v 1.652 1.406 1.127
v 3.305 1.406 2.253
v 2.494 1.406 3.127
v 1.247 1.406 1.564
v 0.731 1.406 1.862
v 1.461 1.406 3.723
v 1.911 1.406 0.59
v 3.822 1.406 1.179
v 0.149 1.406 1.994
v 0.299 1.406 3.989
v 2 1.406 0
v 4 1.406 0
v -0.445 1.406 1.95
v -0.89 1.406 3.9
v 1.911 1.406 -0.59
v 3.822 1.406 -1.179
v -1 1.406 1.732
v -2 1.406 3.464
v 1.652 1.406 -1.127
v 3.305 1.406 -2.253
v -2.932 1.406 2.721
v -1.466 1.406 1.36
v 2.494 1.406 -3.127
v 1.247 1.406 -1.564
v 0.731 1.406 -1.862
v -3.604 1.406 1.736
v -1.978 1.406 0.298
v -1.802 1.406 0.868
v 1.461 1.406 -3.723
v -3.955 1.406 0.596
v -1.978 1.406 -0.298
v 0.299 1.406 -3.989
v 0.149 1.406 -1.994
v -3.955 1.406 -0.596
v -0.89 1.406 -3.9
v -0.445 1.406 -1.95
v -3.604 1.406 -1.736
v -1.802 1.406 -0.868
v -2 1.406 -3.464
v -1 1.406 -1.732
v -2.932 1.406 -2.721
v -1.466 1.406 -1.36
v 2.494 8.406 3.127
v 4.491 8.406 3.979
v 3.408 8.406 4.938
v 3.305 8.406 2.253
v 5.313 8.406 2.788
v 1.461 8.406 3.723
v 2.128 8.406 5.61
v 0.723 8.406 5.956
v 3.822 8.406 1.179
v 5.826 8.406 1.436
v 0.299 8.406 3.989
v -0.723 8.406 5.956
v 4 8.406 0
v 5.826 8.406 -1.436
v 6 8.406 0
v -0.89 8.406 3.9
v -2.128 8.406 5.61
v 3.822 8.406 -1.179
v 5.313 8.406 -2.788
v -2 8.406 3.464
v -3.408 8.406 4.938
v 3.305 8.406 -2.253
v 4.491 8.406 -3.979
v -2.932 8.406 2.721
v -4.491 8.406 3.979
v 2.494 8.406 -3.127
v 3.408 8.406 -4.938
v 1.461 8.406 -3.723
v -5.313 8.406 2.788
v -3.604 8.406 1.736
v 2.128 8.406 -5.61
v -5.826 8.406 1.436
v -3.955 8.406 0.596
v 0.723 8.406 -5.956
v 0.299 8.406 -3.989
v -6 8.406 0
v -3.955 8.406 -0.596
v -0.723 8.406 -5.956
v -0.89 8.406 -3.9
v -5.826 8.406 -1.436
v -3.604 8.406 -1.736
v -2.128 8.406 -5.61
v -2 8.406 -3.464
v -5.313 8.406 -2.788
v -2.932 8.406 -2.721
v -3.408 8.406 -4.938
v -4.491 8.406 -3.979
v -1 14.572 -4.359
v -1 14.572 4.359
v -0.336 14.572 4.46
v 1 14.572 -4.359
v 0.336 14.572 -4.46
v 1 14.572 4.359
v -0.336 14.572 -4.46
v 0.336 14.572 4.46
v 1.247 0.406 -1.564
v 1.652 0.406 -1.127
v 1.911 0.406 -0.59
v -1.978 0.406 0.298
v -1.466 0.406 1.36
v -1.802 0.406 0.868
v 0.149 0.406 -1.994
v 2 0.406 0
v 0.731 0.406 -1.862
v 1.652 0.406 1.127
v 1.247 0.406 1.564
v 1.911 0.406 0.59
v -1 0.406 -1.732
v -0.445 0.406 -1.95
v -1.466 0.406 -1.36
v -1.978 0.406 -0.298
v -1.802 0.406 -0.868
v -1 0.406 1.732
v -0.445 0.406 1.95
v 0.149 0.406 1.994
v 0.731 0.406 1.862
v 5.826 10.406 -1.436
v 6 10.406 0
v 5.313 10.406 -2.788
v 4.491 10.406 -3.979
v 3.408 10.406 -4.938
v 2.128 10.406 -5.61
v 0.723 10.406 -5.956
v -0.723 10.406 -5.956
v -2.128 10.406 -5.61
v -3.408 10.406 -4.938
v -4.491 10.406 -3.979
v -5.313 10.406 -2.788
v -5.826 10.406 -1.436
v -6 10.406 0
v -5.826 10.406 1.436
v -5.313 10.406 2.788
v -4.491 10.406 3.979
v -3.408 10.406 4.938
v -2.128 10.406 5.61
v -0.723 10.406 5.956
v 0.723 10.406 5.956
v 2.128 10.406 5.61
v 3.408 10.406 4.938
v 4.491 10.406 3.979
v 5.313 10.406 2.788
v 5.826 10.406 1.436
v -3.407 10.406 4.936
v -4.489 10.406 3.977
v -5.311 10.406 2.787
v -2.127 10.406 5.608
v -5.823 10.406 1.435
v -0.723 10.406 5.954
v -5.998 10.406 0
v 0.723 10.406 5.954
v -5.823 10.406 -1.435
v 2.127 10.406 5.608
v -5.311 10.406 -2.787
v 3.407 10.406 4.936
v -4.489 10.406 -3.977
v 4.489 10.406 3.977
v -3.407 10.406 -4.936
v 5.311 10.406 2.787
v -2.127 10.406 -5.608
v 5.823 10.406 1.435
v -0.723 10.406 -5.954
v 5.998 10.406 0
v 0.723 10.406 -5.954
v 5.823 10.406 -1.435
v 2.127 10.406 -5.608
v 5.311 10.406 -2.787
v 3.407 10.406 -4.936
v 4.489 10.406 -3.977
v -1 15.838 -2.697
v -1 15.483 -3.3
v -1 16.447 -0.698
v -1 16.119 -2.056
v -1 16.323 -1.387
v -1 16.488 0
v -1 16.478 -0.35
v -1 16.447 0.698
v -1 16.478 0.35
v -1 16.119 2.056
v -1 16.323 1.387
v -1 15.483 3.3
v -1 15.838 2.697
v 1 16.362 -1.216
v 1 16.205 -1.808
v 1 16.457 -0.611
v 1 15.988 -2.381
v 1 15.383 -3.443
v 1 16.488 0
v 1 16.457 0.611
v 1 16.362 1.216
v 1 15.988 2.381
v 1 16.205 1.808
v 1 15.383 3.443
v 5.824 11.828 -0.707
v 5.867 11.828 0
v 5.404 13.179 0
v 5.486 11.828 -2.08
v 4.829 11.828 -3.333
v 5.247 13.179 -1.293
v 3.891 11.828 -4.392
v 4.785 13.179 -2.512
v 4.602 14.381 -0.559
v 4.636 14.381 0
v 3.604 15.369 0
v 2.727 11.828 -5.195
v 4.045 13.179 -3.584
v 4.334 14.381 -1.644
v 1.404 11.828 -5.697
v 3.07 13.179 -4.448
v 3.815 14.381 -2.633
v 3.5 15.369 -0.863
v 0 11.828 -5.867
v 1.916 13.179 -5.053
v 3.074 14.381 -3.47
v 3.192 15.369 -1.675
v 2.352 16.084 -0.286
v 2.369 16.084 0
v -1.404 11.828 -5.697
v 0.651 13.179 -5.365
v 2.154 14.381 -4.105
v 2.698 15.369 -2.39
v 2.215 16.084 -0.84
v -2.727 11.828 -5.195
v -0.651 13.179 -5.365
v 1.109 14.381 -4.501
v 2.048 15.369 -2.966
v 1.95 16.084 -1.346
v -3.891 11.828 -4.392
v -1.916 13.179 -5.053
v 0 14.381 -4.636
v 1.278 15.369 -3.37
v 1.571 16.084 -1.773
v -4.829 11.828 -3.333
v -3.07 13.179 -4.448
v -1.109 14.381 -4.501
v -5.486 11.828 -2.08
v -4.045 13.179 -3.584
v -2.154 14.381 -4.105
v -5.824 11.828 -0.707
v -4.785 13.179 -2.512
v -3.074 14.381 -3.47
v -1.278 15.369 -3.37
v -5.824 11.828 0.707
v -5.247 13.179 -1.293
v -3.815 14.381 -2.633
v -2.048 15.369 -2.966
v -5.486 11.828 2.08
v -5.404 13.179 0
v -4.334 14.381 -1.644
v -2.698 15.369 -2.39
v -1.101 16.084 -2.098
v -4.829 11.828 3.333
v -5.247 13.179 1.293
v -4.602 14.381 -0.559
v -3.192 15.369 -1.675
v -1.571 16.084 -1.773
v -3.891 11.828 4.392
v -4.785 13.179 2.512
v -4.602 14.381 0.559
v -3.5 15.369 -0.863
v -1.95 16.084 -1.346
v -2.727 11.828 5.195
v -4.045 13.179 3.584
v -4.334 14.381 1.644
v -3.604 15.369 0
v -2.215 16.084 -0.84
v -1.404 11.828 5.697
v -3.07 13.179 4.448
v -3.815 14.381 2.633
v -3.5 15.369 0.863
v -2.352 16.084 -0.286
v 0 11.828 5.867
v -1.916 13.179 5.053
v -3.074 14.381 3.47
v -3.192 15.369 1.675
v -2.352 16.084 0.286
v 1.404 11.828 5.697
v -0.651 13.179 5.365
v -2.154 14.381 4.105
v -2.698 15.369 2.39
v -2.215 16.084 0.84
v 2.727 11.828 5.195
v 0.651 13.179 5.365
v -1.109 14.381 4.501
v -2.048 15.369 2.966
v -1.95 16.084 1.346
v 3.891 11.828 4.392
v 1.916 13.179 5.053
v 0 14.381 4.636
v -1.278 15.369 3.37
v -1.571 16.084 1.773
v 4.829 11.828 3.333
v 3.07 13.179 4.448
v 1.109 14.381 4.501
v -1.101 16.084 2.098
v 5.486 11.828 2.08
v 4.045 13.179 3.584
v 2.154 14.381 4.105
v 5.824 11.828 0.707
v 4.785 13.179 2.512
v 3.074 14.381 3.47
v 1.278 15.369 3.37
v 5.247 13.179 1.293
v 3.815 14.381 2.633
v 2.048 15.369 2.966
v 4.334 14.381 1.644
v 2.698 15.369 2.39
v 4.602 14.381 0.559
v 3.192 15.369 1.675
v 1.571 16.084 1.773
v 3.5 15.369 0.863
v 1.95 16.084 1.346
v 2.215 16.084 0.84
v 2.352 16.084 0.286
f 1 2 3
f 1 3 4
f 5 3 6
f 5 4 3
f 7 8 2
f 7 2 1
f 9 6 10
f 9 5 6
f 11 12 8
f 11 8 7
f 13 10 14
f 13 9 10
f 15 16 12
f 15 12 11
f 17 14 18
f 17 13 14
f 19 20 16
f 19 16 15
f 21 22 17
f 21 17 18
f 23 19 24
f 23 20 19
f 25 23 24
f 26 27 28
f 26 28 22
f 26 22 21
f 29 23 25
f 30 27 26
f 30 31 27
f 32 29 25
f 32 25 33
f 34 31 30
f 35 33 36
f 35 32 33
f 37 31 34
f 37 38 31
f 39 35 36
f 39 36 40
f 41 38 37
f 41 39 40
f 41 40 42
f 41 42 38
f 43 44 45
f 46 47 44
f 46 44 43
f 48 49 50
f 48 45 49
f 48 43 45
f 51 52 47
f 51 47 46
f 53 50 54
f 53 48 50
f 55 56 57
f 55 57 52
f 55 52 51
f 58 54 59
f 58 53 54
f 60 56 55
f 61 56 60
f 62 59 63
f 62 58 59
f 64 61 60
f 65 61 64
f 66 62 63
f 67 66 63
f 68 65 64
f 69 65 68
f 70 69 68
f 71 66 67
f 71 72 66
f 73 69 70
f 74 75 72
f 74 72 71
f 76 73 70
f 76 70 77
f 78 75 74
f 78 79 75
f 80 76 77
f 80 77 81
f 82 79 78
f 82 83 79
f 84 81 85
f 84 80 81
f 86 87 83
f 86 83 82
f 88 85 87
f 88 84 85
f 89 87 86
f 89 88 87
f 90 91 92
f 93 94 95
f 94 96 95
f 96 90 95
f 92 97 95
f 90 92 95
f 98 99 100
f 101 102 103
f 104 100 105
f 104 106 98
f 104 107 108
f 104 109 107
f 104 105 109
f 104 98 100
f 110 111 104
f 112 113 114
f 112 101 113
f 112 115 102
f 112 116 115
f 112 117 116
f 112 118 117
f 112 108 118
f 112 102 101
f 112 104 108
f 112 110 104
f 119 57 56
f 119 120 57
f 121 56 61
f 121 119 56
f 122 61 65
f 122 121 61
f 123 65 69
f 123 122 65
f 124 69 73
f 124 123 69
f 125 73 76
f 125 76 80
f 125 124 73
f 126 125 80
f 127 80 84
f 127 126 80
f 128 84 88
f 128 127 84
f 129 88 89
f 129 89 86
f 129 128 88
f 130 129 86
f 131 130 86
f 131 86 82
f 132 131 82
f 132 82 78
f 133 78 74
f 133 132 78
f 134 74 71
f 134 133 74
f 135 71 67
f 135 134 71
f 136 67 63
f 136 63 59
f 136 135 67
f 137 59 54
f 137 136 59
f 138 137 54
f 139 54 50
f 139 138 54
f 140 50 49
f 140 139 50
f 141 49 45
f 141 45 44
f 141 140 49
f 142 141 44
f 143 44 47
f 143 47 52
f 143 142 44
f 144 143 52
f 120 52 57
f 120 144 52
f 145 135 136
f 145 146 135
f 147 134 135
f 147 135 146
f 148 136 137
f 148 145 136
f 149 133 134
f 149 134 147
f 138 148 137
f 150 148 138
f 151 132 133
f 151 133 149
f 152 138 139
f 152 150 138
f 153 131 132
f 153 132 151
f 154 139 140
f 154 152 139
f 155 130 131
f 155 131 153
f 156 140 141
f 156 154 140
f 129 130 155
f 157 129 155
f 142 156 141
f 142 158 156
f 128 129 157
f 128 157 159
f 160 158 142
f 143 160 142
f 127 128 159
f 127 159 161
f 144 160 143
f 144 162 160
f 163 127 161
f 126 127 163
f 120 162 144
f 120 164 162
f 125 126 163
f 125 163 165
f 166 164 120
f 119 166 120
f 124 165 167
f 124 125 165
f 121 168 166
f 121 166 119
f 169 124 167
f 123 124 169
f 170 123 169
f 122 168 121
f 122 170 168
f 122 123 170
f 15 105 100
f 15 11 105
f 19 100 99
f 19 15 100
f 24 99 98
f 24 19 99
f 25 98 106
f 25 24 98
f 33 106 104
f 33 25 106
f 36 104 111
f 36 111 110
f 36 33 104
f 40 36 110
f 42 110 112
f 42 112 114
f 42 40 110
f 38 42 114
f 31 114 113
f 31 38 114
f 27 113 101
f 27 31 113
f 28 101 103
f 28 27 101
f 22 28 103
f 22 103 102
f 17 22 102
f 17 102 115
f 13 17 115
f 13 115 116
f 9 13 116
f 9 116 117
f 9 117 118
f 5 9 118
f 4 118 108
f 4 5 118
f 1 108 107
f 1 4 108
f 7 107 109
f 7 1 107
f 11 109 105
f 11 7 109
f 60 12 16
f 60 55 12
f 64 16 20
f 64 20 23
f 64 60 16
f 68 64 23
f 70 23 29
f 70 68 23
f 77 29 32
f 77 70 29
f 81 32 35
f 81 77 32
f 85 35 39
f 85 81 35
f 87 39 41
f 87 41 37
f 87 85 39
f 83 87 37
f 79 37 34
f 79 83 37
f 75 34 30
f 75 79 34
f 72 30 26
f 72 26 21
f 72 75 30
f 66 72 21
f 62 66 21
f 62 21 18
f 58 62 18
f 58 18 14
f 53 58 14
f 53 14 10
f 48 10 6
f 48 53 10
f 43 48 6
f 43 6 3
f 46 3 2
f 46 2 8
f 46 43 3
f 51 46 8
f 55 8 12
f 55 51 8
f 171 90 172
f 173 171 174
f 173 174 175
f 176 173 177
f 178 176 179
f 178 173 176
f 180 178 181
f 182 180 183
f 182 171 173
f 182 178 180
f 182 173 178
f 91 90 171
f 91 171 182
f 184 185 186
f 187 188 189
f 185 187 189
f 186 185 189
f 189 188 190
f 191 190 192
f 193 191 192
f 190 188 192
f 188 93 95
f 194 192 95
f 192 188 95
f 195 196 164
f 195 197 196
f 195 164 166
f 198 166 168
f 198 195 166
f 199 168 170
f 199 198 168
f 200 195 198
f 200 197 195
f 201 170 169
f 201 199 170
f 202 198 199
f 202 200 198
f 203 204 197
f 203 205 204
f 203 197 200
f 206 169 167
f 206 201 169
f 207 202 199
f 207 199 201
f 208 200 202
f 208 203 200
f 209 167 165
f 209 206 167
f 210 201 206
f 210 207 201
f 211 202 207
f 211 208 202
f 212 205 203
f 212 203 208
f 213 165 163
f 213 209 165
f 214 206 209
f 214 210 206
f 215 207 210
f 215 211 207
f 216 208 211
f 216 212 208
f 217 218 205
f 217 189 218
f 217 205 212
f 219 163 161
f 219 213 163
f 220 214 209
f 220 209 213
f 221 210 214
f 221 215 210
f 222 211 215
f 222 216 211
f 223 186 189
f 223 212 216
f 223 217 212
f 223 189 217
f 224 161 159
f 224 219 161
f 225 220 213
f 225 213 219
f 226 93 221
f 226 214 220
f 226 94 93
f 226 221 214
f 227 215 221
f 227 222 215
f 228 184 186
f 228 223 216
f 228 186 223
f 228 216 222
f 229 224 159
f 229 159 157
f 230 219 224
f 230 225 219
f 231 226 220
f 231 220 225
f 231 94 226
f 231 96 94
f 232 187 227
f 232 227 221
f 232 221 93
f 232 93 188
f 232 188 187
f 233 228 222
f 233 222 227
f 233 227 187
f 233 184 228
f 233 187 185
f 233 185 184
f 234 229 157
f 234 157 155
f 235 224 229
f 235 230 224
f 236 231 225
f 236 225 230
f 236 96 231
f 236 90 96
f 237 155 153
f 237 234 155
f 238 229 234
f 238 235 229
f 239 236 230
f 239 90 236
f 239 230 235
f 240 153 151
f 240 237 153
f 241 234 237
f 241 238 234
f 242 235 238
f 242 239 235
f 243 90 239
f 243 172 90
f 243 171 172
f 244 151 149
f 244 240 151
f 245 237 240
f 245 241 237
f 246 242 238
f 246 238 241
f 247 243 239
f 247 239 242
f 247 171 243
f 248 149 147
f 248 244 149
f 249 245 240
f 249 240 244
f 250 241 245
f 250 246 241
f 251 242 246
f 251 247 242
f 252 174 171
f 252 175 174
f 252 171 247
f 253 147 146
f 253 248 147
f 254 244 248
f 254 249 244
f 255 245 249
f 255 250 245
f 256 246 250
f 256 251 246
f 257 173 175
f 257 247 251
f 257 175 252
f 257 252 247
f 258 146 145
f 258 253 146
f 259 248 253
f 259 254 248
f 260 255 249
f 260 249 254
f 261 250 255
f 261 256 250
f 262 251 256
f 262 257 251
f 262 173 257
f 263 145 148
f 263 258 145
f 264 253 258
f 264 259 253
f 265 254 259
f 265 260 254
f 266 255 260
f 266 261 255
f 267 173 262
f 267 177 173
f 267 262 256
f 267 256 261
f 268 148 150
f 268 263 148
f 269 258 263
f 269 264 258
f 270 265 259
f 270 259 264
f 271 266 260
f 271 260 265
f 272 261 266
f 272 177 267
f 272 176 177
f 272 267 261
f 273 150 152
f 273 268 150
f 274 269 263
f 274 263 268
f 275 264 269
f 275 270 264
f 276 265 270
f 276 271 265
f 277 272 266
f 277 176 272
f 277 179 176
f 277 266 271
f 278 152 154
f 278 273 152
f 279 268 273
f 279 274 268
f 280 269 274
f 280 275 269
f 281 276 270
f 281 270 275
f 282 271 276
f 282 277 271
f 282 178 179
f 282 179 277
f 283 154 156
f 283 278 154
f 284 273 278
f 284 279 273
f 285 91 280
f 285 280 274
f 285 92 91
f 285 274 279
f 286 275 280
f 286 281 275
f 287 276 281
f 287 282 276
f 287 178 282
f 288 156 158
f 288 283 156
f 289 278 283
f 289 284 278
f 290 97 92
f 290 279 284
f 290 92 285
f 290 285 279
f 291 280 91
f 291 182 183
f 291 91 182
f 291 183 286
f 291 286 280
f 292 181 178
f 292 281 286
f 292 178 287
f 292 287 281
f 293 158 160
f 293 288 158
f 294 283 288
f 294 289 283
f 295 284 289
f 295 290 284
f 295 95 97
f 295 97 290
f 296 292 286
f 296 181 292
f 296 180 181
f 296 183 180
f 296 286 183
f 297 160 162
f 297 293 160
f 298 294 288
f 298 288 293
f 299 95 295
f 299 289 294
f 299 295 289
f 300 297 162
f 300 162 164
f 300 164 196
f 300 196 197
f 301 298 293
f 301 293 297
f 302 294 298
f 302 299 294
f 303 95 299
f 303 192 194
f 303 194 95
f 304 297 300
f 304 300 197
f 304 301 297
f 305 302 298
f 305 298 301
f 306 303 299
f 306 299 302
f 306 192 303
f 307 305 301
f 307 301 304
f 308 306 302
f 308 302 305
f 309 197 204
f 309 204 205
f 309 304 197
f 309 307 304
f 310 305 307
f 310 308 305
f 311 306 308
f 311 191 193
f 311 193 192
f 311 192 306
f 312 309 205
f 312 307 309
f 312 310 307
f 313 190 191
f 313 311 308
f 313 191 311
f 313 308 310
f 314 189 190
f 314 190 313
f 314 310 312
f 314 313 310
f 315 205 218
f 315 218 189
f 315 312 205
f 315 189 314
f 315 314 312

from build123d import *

# Parameters (mm, degrees)
SKETCH2_W          = 2
SKETCH2_H          = 4
CUT_EXTRUDE1_DEPTH = 5


with BuildPart() as part:
    # Sketch1 → Revolve1 (revolve)
    with BuildSketch(Plane.XY):
        with BuildLine():
            Line((6, 10.406467745), (5.997713172, 10.406467745))
            ThreePointArc((5.997713172, 10.406467745), (4.300804682, 14.755776187), (0, 16.572108049))
            Line((0, 16.572108049), (0, 0.406467745))
            Line((0, 0.406467745), (2, 0.406467745))
            Line((2, 0.406467745), (2, 1.406467745))
            Line((2, 1.406467745), (4, 1.406467745))
            Line((4, 1.406467745), (4, 8.406467745))
            Line((4, 8.406467745), (6, 8.406467745))
            Line((6, 8.406467745), (6, 10.406467745))
        make_face()
    revolve(axis=Axis((0, 0.406467745, 0), (0, 1, 0)))

    # Sketch2 → Cut-Extrude1 (cut, symmetric)
    with BuildSketch(Plane.XY):
        with Locations((0, 16.572108049)):
            Rectangle(SKETCH2_W, SKETCH2_H)
    extrude(amount=CUT_EXTRUDE1_DEPTH, both=True, mode=Mode.SUBTRACT)


solid = part.part
